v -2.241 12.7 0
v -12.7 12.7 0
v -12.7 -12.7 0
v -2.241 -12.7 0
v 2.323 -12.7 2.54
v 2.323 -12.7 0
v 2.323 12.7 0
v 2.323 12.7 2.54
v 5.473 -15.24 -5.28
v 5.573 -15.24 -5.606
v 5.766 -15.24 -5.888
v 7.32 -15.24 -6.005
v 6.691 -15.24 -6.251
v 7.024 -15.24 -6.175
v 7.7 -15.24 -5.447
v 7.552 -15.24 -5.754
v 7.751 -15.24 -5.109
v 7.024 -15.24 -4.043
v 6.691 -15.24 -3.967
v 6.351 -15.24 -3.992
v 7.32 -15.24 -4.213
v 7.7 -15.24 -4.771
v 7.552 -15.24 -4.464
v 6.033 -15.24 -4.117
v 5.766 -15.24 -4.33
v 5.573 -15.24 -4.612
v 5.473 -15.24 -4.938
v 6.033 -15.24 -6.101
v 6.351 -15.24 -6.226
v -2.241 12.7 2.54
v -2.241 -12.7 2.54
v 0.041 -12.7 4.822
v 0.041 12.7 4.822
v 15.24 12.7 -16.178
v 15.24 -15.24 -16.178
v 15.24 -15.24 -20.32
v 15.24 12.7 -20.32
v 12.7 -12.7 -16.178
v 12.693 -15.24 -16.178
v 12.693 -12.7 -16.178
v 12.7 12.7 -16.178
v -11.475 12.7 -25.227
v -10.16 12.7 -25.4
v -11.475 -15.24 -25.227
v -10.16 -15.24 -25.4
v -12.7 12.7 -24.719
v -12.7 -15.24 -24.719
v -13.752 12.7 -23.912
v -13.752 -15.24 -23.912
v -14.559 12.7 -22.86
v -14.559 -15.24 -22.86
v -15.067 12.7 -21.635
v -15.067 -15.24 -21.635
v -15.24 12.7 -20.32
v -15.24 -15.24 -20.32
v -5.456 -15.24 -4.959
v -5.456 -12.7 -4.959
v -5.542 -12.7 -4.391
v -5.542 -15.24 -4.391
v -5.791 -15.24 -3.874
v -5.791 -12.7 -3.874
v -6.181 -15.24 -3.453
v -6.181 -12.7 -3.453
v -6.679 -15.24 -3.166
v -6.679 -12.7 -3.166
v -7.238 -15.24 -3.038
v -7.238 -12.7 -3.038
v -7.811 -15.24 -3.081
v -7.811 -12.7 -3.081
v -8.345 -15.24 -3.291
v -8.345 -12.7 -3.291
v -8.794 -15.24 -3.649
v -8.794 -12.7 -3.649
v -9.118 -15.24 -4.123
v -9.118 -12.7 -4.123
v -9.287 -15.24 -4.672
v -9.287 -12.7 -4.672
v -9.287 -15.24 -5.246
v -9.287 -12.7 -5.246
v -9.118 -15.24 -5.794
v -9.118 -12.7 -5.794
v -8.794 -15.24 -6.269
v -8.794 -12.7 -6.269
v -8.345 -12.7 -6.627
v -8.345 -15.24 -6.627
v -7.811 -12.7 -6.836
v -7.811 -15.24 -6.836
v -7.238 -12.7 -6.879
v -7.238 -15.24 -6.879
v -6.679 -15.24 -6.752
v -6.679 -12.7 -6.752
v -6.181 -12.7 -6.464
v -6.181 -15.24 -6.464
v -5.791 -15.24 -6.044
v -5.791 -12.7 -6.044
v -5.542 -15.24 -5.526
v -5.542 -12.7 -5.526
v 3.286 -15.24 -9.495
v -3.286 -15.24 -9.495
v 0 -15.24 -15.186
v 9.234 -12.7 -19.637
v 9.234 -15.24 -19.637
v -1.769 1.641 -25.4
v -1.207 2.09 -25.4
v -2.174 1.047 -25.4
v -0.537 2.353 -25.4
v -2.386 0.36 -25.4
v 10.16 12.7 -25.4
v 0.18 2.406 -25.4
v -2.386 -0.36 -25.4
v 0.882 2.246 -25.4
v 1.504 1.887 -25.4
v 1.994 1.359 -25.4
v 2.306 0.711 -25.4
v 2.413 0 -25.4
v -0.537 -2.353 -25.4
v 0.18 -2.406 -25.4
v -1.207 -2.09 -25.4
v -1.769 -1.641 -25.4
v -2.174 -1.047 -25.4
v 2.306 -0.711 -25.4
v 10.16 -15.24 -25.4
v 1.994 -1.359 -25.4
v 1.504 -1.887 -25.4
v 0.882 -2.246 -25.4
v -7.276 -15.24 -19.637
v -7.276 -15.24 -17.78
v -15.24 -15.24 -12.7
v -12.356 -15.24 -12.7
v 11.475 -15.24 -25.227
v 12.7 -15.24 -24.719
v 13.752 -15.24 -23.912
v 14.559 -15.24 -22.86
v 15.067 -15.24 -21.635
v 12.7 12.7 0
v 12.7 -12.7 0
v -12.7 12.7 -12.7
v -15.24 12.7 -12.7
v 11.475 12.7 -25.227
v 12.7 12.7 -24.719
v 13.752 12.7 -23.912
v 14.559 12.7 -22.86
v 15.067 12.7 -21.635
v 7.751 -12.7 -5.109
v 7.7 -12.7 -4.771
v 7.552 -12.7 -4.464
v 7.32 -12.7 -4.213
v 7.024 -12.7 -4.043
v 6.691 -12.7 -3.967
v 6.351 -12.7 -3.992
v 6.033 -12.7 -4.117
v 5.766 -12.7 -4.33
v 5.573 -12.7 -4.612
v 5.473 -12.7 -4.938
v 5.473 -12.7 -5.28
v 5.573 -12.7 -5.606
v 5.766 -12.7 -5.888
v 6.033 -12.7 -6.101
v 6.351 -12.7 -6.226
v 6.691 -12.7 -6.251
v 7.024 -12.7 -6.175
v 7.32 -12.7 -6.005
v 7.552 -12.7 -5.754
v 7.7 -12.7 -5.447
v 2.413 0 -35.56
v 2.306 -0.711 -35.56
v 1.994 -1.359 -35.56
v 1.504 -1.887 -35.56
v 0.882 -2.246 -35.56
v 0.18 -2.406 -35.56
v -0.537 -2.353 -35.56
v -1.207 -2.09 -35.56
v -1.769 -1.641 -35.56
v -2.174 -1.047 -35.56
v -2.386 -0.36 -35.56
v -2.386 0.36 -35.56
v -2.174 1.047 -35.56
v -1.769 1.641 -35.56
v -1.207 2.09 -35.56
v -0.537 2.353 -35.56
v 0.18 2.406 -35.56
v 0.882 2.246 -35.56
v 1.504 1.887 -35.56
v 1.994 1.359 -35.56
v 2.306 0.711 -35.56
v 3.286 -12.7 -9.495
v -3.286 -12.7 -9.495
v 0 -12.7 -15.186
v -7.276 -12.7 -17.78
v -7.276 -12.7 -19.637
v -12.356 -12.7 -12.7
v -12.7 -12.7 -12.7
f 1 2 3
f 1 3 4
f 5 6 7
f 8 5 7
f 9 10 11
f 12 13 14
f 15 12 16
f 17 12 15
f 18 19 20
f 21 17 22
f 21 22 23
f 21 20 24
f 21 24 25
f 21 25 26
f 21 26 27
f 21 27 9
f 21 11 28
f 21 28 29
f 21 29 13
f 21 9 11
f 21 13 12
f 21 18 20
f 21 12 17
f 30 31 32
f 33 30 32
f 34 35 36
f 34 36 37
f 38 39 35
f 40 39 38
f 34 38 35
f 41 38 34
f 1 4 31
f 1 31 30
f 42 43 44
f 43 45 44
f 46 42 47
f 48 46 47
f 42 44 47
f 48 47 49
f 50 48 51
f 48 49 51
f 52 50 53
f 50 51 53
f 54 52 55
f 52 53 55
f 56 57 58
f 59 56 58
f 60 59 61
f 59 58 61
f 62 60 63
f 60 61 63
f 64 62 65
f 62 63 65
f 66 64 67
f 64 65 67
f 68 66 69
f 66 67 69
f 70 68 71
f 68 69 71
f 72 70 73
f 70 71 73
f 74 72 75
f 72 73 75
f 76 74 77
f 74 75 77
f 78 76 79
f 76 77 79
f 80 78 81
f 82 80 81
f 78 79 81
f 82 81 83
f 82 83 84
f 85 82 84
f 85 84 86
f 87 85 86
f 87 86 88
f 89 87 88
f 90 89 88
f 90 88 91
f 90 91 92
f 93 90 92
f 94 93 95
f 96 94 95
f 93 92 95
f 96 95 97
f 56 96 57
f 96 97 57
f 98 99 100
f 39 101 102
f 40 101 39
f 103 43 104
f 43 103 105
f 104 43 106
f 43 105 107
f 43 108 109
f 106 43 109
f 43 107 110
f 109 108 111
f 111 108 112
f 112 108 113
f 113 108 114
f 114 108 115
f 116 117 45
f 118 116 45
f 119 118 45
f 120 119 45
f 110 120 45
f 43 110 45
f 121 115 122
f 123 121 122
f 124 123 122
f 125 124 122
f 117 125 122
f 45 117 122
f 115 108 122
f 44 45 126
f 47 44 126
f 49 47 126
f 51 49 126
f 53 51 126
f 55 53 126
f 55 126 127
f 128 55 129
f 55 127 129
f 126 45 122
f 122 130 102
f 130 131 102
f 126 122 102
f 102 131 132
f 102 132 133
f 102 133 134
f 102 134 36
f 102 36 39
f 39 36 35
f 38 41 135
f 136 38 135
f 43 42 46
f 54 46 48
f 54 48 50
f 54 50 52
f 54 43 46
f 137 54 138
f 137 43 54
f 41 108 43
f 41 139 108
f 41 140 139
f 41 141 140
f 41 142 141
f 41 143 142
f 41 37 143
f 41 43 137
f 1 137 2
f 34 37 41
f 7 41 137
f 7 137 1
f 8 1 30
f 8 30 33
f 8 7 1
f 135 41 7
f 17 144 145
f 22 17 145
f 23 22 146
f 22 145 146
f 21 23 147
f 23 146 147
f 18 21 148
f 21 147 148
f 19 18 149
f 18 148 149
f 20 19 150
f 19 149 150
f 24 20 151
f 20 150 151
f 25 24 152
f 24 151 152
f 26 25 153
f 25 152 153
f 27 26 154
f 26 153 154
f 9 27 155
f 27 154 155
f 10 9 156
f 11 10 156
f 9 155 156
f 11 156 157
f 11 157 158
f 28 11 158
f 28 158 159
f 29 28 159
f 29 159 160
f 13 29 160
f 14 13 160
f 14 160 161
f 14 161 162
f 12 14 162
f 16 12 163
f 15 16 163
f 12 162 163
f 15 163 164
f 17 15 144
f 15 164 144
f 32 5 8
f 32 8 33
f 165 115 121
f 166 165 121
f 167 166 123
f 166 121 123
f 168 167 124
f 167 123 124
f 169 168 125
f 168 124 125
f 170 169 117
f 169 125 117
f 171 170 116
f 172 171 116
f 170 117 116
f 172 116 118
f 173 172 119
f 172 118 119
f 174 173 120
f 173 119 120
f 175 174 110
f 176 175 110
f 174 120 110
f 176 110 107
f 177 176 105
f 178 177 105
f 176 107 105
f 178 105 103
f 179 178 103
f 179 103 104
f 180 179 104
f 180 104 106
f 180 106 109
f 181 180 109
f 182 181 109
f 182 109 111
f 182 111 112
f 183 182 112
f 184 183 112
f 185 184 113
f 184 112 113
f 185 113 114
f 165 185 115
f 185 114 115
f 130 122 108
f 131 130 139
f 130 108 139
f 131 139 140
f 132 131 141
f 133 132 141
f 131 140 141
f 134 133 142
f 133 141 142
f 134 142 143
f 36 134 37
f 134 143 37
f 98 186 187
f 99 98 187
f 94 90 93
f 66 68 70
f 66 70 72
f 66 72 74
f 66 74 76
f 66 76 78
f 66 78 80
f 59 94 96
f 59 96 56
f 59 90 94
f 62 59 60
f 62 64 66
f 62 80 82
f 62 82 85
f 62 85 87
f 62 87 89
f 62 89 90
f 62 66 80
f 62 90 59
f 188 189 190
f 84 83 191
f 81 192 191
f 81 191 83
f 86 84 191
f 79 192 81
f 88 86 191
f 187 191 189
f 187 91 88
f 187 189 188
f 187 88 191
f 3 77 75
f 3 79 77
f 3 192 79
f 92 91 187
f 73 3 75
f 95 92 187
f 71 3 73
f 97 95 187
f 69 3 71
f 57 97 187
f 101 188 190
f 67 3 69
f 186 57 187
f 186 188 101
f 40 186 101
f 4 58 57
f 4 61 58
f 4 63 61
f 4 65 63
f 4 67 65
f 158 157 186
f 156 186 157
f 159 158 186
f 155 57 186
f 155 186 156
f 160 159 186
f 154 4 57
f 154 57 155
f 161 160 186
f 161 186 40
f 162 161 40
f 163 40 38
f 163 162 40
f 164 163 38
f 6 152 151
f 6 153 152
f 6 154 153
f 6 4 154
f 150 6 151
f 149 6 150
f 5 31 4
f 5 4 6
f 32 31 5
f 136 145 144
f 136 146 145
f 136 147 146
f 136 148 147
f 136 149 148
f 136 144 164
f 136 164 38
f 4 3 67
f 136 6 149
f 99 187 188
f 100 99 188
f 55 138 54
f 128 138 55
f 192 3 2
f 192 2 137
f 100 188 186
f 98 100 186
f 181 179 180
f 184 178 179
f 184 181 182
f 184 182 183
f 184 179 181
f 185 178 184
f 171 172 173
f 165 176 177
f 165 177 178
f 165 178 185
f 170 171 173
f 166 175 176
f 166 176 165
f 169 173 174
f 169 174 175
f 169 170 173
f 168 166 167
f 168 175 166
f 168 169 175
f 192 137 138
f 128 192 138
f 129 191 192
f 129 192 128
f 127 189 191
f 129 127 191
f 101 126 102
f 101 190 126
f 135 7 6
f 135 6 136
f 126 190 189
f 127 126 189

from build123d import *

# Parameters (mm, degrees)
F0_W         = 25.4
F0_H         = 25.4
F1_DEPTH     = 25.4
F2_W         = 5.424141106
F2_H         = 6.936683166
F2_W_2       = 5.0867797479
F2_H_2       = 3.4590791911
F3_DEPTH     = 2.54
F4_R         = 1.9260545118
F4_R_2       = 1.1454537096
F5_DEPTH     = 2.54
F7_DEPTH     = 2.54
F8_W         = 27.94
F8_H         = 9.2223960251
F9_DEPTH     = 2.54
F10_W        = 27.94
F10_H        = 12.7
F11_DEPTH    = 2.54
F12_T1_DEPTH = 15.6041495789
F12_T6_DEPTH = 15.6041495789
F13_W        = 4.5640636235
F13_H        = 25.4
F14_DEPTH    = 5.08
F15_T1_DEPTH = 38.4641495789
F16_R        = 5.08
F17_R        = 2.413
F18_DEPTH    = 10.16


# Not quite as in the source:
# - a fillet or chamfer that OpenCascade refuses, or shapes differently, is made with other operations: its cross-section is extruded or revolved along the edge and cut away or added


with BuildPart() as f1:
    # F0 (on Top) → F1 (new body)
    with BuildSketch(Plane.XY):
        Rectangle(F0_W, F0_H)
    extrude(amount=-F1_DEPTH)

    # F2 (on face) → F3 (join)
    with BuildSketch(Plane.XZ.offset(12.7)):
        Polygon((-12.7, -19.636683166), (-12.7, -25.4), (12.7, -25.4), (12.7, -19.636683166), (7.6132202521, -19.636683166), (-7.275858894, -19.636683166), align=None)
        with Locations((-9.987929447, -16.168341583)):
            Rectangle(F2_W, F2_H)
        with Locations((10.156610126, -17.9071435705)):
            Rectangle(F2_W_2, F2_H_2)
    extrude(amount=F3_DEPTH)

    # F4 (on face) → F5 (join)
    with BuildSketch(Plane.XZ.offset(12.7)):
        with Locations((-7.3823751882, -4.9585988745)):
            Circle(F4_R)
        with Locations((6.6054924391, -5.1089939661)):
            Circle(F4_R_2)
    extrude(amount=F5_DEPTH)

    # F6 (on face) → F7 (join)
    with BuildSketch(Plane.XZ.offset(12.7)):
        Polygon((3.2856935422, -9.4954269007), (-3.2856935422, -9.4954269007), (0, -15.1864150539), align=None)
    extrude(amount=F7_DEPTH)

    # F8 (on face) → F9 (join)
    with BuildSketch(Plane.YZ.offset(12.7)):
        with Locations((-1.27, -20.7888019875)):
            Rectangle(F8_W, F8_H)
    extrude(amount=F9_DEPTH)

    # F10 (on face) → F11 (join)
    with BuildSketch(Plane(origin=(-12.7, 0, 0), x_dir=(0, -1, 0), z_dir=(-1, 0, 0))):
        with Locations((1.27, -19.05)):
            Rectangle(F10_W, F10_H)
    extrude(amount=F11_DEPTH)

    # F12: chamfer of 5.08 on 2 edges, made by hand

    # F12_s2 → F12_t1 (cut)
    with BuildSketch(Plane.XZ.offset(12.7)):
        Polygon((-7.275858894, -17.78), (-12.355858894, -12.7), (-7.275858894, -12.7), align=None)
    extrude(amount=F12_T1_DEPTH, mode=Mode.SUBTRACT)


with BuildPart() as f12_tool4:
    # F12_s5 → F12_t6 (new body)
    with BuildSketch(Plane.XZ.offset(12.7)):
        Polygon((7.6132202521, -21.2576039749), (12.6932202521, -16.1776039749), (7.6132202521, -16.1776039749), align=None)
    extrude(amount=F12_T6_DEPTH)

    split(bisect_by=Plane.XY.offset(-19.636683166), keep=Keep.TOP)


with BuildPart() as f1_1:
    add(f1.part)

    # F12_t3: cut F12_tool4
    add(f12_tool4.part, mode=Mode.SUBTRACT)

    # F13 (on face) → F14 (join)
    with BuildSketch(Plane.XY):
        with Locations((0.04063081, 0)):
            Rectangle(F13_W, F13_H)
    extrude(amount=F14_DEPTH)

    # F15: chamfer of 2.54 on 2 edges, made by hand

    # F15_s2 → F15_t1 (cut)
    with BuildSketch(Plane.XZ.offset(-19.2320747894)):
        Polygon((2.3226626217, 2.54), (-0.2173373783, 5.08), (2.3226626217, 5.08), align=None)
        Polygon((-2.2414010018, 2.54), (0.2985989982, 5.08), (-2.2414010018, 5.08), align=None)
    extrude(amount=F15_T1_DEPTH, mode=Mode.SUBTRACT)

    # F16
    f16_edges = [f1_1.edges().sort_by_distance(p)[0] for p in [
        (15.24, -1.27, -25.4),
        (-15.24, -1.27, -25.4),
    ]]
    fillet(f16_edges, radius=F16_R)

    # F17 (on face) → F18 (join)
    with BuildSketch(Plane(origin=(0, 0, -25.4), x_dir=(1, 0, 0), z_dir=(0, 0, -1))):
        Circle(F17_R)
    extrude(amount=F18_DEPTH)


solid = f1_1.part
